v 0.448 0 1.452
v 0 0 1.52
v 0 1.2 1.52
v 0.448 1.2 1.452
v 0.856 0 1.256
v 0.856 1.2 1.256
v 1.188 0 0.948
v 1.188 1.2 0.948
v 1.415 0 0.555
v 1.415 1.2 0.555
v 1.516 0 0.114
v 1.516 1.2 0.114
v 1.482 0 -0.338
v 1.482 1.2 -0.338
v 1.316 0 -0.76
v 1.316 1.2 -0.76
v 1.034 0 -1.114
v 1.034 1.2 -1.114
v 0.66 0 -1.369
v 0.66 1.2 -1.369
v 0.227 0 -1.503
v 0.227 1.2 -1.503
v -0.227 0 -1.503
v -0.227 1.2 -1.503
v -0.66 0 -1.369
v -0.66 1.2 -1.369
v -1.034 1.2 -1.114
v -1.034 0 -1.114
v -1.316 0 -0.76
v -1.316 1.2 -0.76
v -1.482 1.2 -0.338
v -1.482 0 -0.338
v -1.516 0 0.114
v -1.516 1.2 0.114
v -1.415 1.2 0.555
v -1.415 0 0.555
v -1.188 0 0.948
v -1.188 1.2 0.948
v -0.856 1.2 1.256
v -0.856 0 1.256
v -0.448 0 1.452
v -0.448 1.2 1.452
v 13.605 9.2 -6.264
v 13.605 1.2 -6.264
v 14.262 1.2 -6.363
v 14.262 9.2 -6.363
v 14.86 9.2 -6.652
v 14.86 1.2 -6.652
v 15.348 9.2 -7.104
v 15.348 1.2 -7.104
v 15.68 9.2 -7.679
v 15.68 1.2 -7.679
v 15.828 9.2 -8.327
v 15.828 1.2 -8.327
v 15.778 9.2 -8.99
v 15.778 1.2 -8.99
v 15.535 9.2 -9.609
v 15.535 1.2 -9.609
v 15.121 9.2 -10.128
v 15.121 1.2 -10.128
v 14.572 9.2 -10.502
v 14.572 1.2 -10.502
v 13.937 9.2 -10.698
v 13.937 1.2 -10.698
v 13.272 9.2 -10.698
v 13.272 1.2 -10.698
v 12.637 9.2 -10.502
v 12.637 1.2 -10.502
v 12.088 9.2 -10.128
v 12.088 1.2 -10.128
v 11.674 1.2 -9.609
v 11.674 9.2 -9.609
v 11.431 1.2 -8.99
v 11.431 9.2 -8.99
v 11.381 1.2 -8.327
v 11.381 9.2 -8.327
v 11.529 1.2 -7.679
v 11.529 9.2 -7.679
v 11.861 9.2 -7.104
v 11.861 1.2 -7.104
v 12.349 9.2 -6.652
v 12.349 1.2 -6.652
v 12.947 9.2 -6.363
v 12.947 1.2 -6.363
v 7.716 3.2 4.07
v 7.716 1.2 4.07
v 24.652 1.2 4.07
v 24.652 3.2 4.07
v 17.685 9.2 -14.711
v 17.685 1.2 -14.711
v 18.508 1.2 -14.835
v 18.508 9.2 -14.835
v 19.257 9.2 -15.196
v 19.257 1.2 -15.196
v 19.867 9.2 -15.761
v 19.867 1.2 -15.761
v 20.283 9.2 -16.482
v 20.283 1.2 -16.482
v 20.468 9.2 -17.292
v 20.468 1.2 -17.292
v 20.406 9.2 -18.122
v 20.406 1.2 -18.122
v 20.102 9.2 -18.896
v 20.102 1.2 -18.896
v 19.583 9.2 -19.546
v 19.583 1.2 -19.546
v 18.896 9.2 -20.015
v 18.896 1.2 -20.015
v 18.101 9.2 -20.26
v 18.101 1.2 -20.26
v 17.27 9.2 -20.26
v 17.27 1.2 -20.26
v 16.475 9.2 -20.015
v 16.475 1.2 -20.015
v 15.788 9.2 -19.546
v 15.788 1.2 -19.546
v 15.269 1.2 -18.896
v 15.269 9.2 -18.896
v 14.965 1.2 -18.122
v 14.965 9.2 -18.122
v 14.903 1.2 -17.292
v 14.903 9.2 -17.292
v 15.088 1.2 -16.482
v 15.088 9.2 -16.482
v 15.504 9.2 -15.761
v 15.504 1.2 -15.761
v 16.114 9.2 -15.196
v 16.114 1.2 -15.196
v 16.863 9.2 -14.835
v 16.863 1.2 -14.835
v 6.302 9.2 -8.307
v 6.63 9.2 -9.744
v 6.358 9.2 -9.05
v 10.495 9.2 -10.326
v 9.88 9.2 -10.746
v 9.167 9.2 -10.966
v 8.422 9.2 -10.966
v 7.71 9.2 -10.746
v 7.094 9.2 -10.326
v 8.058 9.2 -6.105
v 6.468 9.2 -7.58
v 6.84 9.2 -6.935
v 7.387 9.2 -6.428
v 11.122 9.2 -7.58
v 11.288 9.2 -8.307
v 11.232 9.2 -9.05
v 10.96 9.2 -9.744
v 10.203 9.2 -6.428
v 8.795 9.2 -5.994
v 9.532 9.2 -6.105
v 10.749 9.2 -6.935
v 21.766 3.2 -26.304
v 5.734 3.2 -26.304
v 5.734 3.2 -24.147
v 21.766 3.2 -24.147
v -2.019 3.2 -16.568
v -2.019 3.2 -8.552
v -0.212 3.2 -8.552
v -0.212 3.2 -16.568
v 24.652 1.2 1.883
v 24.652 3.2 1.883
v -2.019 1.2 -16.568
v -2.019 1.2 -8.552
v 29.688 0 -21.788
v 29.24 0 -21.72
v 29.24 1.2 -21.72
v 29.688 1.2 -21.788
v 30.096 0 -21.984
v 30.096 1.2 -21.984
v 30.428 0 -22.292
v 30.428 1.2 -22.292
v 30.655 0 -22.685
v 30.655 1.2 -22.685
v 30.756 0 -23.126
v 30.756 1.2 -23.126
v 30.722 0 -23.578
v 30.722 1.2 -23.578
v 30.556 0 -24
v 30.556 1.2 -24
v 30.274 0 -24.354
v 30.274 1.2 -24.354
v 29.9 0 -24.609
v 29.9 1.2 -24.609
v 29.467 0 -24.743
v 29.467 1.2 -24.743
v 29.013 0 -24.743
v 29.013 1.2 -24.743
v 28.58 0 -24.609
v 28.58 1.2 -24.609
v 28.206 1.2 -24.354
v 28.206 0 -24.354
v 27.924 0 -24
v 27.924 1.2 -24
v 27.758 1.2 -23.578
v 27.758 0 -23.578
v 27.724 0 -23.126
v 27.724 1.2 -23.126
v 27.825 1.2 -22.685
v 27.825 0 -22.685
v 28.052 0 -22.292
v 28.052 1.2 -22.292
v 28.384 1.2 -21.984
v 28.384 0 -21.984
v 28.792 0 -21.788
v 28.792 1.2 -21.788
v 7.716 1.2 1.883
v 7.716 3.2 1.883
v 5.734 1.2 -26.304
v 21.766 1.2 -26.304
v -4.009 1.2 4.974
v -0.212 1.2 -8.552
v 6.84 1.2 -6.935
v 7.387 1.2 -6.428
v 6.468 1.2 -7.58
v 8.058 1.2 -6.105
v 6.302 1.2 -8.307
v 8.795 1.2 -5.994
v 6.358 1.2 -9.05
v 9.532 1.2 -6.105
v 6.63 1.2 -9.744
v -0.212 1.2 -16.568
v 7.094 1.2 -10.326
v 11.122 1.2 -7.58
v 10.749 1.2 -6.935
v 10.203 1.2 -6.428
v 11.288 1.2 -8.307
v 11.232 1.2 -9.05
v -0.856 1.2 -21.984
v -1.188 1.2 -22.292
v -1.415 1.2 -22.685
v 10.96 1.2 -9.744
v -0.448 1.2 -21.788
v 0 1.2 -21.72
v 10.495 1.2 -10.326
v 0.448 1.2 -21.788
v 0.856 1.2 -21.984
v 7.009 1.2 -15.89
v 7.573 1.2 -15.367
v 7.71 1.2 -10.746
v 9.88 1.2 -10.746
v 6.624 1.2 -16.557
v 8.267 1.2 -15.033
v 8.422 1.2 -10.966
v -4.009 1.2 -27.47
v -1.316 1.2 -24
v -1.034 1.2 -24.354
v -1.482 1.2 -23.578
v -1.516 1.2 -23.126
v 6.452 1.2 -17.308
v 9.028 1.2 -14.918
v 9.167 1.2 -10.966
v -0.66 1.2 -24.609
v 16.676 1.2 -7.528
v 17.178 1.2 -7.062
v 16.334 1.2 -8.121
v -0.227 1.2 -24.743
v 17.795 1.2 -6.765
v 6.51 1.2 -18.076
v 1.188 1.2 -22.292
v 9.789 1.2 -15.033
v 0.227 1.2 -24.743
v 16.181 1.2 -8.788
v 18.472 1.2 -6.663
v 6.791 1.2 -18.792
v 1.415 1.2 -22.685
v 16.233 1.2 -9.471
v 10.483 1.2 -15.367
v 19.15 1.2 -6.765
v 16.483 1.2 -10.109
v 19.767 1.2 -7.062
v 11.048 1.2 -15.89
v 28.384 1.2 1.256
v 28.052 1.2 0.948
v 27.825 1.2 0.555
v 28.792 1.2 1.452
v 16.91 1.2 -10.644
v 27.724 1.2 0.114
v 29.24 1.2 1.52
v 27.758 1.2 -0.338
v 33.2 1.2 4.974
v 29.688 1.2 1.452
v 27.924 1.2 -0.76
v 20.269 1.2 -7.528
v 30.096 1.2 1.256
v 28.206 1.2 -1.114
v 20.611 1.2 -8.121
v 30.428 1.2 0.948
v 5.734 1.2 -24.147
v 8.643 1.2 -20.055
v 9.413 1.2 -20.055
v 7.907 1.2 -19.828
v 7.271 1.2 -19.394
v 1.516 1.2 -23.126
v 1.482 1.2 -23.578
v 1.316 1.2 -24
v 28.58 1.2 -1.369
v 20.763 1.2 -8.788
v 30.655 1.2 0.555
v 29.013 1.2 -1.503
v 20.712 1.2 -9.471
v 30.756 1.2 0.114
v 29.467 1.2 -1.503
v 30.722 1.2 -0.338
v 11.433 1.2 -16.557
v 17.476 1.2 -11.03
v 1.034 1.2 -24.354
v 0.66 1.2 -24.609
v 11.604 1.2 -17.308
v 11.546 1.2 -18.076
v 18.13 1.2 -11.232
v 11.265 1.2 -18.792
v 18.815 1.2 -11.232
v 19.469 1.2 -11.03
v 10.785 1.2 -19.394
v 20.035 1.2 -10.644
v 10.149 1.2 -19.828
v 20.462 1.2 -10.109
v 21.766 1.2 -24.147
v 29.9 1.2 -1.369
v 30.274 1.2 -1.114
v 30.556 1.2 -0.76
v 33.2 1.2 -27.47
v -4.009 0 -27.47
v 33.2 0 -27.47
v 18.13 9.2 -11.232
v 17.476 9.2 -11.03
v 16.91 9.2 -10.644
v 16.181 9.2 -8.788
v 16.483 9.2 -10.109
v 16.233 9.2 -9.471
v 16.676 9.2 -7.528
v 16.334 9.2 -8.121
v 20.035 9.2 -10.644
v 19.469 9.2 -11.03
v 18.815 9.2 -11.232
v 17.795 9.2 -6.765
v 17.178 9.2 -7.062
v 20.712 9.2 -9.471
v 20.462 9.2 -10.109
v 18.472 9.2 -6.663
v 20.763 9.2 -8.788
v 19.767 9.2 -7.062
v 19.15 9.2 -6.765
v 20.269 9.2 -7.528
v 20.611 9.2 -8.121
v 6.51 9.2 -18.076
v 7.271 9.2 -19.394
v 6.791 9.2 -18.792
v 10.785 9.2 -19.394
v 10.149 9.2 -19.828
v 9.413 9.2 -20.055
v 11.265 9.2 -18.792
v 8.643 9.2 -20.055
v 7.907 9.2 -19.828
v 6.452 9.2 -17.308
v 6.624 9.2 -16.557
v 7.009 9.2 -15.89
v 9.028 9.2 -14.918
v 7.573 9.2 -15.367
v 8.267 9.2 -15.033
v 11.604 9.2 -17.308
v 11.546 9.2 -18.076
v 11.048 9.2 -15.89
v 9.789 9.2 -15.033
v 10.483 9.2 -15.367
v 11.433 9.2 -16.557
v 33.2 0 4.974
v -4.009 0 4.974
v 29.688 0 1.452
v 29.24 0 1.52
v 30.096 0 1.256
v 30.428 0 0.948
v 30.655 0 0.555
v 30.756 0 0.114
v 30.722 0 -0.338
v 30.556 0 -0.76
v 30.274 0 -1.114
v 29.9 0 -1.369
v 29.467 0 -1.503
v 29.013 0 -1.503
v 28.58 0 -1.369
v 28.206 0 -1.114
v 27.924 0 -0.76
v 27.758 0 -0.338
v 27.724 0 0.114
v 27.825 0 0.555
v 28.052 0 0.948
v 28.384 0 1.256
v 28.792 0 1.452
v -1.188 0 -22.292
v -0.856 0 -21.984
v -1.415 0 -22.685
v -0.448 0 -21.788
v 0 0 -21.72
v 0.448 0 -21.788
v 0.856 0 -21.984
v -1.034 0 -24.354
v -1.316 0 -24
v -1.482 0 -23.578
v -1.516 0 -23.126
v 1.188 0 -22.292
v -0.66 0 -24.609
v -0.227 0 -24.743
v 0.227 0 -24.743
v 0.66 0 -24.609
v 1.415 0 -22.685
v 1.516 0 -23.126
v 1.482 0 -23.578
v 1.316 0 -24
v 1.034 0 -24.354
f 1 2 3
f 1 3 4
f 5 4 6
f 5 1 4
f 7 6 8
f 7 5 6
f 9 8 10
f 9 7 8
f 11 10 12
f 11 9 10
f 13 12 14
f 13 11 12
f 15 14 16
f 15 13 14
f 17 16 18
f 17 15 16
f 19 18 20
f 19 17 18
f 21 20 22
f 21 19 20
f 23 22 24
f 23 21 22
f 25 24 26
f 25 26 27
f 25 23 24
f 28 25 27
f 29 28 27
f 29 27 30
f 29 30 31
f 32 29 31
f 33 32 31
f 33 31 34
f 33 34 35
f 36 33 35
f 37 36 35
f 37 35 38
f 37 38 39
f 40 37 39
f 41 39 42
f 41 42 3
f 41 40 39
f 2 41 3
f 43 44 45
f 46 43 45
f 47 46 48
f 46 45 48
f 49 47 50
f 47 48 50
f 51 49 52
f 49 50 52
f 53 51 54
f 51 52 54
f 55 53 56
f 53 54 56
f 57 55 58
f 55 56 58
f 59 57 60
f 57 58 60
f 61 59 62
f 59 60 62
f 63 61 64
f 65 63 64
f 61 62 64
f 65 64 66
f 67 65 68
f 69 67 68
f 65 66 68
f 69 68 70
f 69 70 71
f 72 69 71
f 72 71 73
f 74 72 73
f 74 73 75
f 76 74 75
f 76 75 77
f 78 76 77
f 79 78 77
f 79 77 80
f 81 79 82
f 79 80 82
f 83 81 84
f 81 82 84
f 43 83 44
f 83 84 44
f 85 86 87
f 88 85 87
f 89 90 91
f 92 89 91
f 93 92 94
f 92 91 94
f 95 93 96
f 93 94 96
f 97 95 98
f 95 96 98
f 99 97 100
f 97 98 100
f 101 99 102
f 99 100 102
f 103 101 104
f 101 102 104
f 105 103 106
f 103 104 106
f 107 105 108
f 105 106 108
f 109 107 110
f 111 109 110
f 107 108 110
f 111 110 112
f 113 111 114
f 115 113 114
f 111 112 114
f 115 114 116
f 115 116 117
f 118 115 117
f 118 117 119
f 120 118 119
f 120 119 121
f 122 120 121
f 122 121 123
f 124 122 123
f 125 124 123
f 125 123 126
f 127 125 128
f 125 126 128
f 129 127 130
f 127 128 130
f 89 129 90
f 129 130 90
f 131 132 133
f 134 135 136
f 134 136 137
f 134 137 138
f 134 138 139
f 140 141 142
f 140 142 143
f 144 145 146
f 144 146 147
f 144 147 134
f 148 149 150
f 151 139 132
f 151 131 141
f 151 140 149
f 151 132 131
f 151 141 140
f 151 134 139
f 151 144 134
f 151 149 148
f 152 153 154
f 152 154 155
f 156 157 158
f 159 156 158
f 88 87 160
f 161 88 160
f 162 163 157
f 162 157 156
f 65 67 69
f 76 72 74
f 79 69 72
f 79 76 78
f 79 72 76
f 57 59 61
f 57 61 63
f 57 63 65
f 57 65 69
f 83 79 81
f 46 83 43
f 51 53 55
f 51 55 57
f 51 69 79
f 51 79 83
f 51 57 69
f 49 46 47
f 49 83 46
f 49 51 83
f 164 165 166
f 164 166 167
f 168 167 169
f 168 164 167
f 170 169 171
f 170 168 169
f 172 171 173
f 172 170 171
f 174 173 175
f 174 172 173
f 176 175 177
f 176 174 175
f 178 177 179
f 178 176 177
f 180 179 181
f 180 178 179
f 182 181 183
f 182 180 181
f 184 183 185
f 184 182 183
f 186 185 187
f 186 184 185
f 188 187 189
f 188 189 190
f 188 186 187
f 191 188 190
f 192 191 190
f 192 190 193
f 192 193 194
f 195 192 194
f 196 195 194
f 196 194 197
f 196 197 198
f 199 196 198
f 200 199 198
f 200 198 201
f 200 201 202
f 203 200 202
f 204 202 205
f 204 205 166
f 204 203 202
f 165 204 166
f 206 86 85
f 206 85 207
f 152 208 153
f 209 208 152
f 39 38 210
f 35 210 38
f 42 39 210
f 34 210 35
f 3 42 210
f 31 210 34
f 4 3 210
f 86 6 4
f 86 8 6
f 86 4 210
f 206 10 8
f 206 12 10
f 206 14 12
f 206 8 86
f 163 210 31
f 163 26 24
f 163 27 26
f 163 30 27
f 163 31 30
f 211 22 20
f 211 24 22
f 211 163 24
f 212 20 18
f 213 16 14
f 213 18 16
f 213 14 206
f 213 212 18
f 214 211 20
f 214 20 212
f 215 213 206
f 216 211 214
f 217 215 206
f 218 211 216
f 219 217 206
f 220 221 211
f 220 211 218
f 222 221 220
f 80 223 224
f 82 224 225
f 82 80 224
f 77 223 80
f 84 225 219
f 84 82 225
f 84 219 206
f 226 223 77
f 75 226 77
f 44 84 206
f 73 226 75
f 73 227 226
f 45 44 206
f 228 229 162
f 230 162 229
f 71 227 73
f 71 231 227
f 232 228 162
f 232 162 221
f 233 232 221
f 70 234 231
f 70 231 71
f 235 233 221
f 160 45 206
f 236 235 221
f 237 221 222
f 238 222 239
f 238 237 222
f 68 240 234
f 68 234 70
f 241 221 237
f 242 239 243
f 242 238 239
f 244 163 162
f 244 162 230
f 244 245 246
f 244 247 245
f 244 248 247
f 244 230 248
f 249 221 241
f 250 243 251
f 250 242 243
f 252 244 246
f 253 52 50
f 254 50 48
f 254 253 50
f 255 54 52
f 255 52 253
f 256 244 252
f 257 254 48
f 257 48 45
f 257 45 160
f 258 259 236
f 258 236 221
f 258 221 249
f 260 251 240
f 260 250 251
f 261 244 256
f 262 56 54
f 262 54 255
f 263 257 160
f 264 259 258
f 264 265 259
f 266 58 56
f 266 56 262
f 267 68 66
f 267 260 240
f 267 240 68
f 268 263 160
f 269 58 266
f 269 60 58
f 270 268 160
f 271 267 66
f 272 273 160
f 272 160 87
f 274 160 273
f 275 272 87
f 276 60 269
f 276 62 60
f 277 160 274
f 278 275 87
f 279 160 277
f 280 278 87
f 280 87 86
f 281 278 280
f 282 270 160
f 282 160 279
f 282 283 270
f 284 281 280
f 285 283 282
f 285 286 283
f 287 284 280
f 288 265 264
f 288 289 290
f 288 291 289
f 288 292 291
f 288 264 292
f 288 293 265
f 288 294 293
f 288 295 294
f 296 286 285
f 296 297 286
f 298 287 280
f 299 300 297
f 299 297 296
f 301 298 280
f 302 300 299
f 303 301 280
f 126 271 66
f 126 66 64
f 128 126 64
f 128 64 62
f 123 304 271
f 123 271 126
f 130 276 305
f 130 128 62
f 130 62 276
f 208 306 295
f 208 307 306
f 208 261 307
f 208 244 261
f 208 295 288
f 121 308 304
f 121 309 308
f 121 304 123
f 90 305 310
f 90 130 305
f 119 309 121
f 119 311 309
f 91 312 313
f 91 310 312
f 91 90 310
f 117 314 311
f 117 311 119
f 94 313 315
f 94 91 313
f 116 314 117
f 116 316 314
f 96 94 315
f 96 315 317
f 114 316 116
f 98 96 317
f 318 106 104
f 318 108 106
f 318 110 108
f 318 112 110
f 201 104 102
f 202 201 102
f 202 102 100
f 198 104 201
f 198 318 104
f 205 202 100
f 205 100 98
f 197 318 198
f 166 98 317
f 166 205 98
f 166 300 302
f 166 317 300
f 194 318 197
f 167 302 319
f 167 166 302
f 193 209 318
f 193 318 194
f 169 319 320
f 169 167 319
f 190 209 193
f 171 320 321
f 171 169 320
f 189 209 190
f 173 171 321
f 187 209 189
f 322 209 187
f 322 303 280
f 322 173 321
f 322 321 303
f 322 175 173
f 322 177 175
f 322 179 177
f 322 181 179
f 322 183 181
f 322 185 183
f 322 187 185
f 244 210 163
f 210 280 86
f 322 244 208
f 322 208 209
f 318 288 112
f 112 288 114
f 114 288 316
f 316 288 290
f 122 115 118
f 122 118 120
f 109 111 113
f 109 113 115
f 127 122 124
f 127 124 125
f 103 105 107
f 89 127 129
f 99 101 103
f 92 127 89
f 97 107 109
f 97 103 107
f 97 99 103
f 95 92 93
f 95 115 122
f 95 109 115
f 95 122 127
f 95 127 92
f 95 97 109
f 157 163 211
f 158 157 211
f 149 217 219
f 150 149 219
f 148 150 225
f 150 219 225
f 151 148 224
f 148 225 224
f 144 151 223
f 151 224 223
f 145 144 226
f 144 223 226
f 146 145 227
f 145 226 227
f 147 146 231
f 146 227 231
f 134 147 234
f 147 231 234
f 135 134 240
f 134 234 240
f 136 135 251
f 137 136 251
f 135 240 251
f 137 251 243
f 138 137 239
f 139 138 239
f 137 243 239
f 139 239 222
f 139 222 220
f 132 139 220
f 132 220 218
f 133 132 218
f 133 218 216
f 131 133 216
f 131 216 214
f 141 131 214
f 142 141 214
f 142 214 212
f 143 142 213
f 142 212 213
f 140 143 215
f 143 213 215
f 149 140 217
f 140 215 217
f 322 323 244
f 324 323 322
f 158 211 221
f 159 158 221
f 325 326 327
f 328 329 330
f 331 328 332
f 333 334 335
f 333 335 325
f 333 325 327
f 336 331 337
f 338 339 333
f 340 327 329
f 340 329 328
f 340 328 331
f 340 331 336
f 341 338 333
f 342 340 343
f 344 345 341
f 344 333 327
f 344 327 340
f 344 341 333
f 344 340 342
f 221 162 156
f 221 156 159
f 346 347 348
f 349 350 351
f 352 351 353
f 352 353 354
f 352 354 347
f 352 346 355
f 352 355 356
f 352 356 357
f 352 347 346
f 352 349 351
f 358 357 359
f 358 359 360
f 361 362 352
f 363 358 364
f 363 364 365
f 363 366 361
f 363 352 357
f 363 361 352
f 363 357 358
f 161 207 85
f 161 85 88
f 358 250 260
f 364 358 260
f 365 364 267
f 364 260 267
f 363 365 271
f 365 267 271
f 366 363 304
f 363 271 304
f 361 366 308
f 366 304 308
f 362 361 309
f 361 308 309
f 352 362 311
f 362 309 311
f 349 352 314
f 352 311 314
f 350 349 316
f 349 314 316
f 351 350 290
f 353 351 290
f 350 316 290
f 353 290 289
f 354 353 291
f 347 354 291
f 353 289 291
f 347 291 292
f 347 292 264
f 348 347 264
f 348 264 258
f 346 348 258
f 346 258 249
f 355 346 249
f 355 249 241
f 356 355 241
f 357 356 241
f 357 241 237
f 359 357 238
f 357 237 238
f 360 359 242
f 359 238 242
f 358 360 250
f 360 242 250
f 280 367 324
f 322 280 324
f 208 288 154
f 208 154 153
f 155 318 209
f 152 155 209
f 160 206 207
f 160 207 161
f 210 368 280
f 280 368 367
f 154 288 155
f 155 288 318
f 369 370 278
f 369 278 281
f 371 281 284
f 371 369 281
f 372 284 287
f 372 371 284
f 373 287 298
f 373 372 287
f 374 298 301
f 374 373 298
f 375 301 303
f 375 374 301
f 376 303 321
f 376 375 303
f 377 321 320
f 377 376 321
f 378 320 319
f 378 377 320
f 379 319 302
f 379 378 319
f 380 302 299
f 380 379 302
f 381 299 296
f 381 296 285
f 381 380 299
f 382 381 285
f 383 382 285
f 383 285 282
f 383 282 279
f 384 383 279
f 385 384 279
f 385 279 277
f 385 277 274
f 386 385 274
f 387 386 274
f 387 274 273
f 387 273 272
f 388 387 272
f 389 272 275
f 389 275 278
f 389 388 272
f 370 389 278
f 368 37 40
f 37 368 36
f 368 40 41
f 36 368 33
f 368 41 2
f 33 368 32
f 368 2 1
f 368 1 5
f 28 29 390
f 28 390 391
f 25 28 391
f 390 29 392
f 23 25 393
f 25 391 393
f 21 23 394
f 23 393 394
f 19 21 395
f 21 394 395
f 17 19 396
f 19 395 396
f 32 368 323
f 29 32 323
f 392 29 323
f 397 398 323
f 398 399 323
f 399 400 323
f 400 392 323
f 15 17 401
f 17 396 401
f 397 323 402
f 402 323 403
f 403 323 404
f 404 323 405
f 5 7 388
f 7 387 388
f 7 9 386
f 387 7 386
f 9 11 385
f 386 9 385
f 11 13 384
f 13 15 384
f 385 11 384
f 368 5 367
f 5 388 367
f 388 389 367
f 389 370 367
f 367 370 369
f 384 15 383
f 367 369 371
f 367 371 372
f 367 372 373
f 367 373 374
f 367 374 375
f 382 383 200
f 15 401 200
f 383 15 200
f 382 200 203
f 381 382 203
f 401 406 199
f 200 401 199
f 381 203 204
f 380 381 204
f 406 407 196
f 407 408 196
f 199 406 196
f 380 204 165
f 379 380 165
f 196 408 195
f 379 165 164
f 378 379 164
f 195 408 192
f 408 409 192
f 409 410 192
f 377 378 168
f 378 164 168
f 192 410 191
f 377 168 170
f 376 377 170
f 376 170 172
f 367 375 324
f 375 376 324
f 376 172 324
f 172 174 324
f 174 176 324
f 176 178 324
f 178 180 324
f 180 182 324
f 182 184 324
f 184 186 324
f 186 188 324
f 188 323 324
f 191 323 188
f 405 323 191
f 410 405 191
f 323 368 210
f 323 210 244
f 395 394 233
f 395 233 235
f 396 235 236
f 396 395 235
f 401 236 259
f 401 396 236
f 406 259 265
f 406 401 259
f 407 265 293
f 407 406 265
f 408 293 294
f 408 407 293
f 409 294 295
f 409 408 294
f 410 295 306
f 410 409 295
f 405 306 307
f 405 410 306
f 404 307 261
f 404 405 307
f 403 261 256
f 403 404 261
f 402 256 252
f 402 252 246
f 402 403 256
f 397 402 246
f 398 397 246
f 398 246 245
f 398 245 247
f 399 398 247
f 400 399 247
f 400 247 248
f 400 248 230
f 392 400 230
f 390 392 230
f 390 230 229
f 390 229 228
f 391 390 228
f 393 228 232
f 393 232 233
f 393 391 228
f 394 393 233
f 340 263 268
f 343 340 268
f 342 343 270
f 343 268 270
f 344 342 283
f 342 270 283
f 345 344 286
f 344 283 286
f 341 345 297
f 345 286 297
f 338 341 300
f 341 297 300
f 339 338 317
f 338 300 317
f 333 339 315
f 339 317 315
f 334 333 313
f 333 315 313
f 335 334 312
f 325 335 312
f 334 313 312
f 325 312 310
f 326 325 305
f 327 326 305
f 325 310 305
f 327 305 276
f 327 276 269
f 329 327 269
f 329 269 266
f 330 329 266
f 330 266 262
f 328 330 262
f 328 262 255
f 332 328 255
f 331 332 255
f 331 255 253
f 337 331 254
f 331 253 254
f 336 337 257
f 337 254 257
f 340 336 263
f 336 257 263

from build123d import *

# Parameters (mm, degrees)
SKETCH1_W           = 37.208239372
SKETCH1_H           = 32.443769696
SKETCH1_R           = 1.52
BOSS_EXTRUDE1_DEPTH = 1.2
SKETCH2_R           = 2.583124011
SKETCH2_R_2         = 2.790118195
SKETCH2_R_3         = 2.5
SKETCH2_R_4         = 2.297434725
SKETCH2_R_5         = 2.229489291
BOSS_EXTRUDE3_DEPTH = 8
SKETCH3_W           = 16.935717079
SKETCH3_H           = 2.186194115
SKETCH3_W_2         = 16.032090178
SKETCH3_H_2         = 2.157044861
SKETCH3_W_3         = 1.807253802
SKETCH3_H_3         = 8.016045089
BOSS_EXTRUDE4_DEPTH = 2


with BuildPart() as part:
    # Sketch1 → Boss-Extrude1 (new body)
    with BuildSketch(Plane(origin=(0, 0, 0), x_dir=(1, 0, 0), z_dir=(0, 1, 0))):
        with Locations((14.595582384, 11.248361917)):
            Rectangle(SKETCH1_W, SKETCH1_H)
        with Locations(Location((0, 0, 0), (0, 0, 270))):
            Circle(SKETCH1_R, mode=Mode.SUBTRACT)
        with Locations(Location((29.24, 0, 0), (0, 0, 270))):
            Circle(SKETCH1_R, mode=Mode.SUBTRACT)
        with Locations(Location((29.24, 23.24, 0), (0, 0, 270))):
            Circle(SKETCH1_R, mode=Mode.SUBTRACT)
        with Locations(Location((0, 23.24, 0), (0, 0, 270))):
            Circle(SKETCH1_R, mode=Mode.SUBTRACT)
    extrude(amount=BOSS_EXTRUDE1_DEPTH)

    # Sketch2 → Boss-Extrude3 (add)
    with BuildSketch(Plane(origin=(0, 1.2, 0), x_dir=(1, 0, 0), z_dir=(0, 1, 0))):
        with Locations(Location((9.028074704, 17.500877086, 0), (0, 0, 270))):
            Circle(SKETCH2_R)
        with Locations(Location((17.6854034, 17.500877086, 0), (0, 0, 270))):
            Circle(SKETCH2_R_2)
        with Locations(Location((8.794880665, 8.493757332, 0), (0, 0, 270))):
            Circle(SKETCH2_R_3)
        with Locations(Location((18.472433282, 8.960145409, 0), (0, 0, 270))):
            Circle(SKETCH2_R_4)
        with Locations(Location((13.604507718, 8.493757332, 0), (0, 0, 270))):
            Circle(SKETCH2_R_5)
    extrude(amount=BOSS_EXTRUDE3_DEPTH)

    # Sketch3 → Boss-Extrude4 (add)
    with BuildSketch(Plane(origin=(0, 1.2, 0), x_dir=(1, 0, 0), z_dir=(0, 1, 0))):
        with Locations((16.184216775, -2.976474459)):
            Rectangle(SKETCH3_W, SKETCH3_H)
        with Locations((13.750253993, 25.225429627)):
            Rectangle(SKETCH3_W_2, SKETCH3_H_2)
        with Locations((-1.115865991, 12.560078386)):
            Rectangle(SKETCH3_W_3, SKETCH3_H_3)
    extrude(amount=BOSS_EXTRUDE4_DEPTH)


solid = part.part
